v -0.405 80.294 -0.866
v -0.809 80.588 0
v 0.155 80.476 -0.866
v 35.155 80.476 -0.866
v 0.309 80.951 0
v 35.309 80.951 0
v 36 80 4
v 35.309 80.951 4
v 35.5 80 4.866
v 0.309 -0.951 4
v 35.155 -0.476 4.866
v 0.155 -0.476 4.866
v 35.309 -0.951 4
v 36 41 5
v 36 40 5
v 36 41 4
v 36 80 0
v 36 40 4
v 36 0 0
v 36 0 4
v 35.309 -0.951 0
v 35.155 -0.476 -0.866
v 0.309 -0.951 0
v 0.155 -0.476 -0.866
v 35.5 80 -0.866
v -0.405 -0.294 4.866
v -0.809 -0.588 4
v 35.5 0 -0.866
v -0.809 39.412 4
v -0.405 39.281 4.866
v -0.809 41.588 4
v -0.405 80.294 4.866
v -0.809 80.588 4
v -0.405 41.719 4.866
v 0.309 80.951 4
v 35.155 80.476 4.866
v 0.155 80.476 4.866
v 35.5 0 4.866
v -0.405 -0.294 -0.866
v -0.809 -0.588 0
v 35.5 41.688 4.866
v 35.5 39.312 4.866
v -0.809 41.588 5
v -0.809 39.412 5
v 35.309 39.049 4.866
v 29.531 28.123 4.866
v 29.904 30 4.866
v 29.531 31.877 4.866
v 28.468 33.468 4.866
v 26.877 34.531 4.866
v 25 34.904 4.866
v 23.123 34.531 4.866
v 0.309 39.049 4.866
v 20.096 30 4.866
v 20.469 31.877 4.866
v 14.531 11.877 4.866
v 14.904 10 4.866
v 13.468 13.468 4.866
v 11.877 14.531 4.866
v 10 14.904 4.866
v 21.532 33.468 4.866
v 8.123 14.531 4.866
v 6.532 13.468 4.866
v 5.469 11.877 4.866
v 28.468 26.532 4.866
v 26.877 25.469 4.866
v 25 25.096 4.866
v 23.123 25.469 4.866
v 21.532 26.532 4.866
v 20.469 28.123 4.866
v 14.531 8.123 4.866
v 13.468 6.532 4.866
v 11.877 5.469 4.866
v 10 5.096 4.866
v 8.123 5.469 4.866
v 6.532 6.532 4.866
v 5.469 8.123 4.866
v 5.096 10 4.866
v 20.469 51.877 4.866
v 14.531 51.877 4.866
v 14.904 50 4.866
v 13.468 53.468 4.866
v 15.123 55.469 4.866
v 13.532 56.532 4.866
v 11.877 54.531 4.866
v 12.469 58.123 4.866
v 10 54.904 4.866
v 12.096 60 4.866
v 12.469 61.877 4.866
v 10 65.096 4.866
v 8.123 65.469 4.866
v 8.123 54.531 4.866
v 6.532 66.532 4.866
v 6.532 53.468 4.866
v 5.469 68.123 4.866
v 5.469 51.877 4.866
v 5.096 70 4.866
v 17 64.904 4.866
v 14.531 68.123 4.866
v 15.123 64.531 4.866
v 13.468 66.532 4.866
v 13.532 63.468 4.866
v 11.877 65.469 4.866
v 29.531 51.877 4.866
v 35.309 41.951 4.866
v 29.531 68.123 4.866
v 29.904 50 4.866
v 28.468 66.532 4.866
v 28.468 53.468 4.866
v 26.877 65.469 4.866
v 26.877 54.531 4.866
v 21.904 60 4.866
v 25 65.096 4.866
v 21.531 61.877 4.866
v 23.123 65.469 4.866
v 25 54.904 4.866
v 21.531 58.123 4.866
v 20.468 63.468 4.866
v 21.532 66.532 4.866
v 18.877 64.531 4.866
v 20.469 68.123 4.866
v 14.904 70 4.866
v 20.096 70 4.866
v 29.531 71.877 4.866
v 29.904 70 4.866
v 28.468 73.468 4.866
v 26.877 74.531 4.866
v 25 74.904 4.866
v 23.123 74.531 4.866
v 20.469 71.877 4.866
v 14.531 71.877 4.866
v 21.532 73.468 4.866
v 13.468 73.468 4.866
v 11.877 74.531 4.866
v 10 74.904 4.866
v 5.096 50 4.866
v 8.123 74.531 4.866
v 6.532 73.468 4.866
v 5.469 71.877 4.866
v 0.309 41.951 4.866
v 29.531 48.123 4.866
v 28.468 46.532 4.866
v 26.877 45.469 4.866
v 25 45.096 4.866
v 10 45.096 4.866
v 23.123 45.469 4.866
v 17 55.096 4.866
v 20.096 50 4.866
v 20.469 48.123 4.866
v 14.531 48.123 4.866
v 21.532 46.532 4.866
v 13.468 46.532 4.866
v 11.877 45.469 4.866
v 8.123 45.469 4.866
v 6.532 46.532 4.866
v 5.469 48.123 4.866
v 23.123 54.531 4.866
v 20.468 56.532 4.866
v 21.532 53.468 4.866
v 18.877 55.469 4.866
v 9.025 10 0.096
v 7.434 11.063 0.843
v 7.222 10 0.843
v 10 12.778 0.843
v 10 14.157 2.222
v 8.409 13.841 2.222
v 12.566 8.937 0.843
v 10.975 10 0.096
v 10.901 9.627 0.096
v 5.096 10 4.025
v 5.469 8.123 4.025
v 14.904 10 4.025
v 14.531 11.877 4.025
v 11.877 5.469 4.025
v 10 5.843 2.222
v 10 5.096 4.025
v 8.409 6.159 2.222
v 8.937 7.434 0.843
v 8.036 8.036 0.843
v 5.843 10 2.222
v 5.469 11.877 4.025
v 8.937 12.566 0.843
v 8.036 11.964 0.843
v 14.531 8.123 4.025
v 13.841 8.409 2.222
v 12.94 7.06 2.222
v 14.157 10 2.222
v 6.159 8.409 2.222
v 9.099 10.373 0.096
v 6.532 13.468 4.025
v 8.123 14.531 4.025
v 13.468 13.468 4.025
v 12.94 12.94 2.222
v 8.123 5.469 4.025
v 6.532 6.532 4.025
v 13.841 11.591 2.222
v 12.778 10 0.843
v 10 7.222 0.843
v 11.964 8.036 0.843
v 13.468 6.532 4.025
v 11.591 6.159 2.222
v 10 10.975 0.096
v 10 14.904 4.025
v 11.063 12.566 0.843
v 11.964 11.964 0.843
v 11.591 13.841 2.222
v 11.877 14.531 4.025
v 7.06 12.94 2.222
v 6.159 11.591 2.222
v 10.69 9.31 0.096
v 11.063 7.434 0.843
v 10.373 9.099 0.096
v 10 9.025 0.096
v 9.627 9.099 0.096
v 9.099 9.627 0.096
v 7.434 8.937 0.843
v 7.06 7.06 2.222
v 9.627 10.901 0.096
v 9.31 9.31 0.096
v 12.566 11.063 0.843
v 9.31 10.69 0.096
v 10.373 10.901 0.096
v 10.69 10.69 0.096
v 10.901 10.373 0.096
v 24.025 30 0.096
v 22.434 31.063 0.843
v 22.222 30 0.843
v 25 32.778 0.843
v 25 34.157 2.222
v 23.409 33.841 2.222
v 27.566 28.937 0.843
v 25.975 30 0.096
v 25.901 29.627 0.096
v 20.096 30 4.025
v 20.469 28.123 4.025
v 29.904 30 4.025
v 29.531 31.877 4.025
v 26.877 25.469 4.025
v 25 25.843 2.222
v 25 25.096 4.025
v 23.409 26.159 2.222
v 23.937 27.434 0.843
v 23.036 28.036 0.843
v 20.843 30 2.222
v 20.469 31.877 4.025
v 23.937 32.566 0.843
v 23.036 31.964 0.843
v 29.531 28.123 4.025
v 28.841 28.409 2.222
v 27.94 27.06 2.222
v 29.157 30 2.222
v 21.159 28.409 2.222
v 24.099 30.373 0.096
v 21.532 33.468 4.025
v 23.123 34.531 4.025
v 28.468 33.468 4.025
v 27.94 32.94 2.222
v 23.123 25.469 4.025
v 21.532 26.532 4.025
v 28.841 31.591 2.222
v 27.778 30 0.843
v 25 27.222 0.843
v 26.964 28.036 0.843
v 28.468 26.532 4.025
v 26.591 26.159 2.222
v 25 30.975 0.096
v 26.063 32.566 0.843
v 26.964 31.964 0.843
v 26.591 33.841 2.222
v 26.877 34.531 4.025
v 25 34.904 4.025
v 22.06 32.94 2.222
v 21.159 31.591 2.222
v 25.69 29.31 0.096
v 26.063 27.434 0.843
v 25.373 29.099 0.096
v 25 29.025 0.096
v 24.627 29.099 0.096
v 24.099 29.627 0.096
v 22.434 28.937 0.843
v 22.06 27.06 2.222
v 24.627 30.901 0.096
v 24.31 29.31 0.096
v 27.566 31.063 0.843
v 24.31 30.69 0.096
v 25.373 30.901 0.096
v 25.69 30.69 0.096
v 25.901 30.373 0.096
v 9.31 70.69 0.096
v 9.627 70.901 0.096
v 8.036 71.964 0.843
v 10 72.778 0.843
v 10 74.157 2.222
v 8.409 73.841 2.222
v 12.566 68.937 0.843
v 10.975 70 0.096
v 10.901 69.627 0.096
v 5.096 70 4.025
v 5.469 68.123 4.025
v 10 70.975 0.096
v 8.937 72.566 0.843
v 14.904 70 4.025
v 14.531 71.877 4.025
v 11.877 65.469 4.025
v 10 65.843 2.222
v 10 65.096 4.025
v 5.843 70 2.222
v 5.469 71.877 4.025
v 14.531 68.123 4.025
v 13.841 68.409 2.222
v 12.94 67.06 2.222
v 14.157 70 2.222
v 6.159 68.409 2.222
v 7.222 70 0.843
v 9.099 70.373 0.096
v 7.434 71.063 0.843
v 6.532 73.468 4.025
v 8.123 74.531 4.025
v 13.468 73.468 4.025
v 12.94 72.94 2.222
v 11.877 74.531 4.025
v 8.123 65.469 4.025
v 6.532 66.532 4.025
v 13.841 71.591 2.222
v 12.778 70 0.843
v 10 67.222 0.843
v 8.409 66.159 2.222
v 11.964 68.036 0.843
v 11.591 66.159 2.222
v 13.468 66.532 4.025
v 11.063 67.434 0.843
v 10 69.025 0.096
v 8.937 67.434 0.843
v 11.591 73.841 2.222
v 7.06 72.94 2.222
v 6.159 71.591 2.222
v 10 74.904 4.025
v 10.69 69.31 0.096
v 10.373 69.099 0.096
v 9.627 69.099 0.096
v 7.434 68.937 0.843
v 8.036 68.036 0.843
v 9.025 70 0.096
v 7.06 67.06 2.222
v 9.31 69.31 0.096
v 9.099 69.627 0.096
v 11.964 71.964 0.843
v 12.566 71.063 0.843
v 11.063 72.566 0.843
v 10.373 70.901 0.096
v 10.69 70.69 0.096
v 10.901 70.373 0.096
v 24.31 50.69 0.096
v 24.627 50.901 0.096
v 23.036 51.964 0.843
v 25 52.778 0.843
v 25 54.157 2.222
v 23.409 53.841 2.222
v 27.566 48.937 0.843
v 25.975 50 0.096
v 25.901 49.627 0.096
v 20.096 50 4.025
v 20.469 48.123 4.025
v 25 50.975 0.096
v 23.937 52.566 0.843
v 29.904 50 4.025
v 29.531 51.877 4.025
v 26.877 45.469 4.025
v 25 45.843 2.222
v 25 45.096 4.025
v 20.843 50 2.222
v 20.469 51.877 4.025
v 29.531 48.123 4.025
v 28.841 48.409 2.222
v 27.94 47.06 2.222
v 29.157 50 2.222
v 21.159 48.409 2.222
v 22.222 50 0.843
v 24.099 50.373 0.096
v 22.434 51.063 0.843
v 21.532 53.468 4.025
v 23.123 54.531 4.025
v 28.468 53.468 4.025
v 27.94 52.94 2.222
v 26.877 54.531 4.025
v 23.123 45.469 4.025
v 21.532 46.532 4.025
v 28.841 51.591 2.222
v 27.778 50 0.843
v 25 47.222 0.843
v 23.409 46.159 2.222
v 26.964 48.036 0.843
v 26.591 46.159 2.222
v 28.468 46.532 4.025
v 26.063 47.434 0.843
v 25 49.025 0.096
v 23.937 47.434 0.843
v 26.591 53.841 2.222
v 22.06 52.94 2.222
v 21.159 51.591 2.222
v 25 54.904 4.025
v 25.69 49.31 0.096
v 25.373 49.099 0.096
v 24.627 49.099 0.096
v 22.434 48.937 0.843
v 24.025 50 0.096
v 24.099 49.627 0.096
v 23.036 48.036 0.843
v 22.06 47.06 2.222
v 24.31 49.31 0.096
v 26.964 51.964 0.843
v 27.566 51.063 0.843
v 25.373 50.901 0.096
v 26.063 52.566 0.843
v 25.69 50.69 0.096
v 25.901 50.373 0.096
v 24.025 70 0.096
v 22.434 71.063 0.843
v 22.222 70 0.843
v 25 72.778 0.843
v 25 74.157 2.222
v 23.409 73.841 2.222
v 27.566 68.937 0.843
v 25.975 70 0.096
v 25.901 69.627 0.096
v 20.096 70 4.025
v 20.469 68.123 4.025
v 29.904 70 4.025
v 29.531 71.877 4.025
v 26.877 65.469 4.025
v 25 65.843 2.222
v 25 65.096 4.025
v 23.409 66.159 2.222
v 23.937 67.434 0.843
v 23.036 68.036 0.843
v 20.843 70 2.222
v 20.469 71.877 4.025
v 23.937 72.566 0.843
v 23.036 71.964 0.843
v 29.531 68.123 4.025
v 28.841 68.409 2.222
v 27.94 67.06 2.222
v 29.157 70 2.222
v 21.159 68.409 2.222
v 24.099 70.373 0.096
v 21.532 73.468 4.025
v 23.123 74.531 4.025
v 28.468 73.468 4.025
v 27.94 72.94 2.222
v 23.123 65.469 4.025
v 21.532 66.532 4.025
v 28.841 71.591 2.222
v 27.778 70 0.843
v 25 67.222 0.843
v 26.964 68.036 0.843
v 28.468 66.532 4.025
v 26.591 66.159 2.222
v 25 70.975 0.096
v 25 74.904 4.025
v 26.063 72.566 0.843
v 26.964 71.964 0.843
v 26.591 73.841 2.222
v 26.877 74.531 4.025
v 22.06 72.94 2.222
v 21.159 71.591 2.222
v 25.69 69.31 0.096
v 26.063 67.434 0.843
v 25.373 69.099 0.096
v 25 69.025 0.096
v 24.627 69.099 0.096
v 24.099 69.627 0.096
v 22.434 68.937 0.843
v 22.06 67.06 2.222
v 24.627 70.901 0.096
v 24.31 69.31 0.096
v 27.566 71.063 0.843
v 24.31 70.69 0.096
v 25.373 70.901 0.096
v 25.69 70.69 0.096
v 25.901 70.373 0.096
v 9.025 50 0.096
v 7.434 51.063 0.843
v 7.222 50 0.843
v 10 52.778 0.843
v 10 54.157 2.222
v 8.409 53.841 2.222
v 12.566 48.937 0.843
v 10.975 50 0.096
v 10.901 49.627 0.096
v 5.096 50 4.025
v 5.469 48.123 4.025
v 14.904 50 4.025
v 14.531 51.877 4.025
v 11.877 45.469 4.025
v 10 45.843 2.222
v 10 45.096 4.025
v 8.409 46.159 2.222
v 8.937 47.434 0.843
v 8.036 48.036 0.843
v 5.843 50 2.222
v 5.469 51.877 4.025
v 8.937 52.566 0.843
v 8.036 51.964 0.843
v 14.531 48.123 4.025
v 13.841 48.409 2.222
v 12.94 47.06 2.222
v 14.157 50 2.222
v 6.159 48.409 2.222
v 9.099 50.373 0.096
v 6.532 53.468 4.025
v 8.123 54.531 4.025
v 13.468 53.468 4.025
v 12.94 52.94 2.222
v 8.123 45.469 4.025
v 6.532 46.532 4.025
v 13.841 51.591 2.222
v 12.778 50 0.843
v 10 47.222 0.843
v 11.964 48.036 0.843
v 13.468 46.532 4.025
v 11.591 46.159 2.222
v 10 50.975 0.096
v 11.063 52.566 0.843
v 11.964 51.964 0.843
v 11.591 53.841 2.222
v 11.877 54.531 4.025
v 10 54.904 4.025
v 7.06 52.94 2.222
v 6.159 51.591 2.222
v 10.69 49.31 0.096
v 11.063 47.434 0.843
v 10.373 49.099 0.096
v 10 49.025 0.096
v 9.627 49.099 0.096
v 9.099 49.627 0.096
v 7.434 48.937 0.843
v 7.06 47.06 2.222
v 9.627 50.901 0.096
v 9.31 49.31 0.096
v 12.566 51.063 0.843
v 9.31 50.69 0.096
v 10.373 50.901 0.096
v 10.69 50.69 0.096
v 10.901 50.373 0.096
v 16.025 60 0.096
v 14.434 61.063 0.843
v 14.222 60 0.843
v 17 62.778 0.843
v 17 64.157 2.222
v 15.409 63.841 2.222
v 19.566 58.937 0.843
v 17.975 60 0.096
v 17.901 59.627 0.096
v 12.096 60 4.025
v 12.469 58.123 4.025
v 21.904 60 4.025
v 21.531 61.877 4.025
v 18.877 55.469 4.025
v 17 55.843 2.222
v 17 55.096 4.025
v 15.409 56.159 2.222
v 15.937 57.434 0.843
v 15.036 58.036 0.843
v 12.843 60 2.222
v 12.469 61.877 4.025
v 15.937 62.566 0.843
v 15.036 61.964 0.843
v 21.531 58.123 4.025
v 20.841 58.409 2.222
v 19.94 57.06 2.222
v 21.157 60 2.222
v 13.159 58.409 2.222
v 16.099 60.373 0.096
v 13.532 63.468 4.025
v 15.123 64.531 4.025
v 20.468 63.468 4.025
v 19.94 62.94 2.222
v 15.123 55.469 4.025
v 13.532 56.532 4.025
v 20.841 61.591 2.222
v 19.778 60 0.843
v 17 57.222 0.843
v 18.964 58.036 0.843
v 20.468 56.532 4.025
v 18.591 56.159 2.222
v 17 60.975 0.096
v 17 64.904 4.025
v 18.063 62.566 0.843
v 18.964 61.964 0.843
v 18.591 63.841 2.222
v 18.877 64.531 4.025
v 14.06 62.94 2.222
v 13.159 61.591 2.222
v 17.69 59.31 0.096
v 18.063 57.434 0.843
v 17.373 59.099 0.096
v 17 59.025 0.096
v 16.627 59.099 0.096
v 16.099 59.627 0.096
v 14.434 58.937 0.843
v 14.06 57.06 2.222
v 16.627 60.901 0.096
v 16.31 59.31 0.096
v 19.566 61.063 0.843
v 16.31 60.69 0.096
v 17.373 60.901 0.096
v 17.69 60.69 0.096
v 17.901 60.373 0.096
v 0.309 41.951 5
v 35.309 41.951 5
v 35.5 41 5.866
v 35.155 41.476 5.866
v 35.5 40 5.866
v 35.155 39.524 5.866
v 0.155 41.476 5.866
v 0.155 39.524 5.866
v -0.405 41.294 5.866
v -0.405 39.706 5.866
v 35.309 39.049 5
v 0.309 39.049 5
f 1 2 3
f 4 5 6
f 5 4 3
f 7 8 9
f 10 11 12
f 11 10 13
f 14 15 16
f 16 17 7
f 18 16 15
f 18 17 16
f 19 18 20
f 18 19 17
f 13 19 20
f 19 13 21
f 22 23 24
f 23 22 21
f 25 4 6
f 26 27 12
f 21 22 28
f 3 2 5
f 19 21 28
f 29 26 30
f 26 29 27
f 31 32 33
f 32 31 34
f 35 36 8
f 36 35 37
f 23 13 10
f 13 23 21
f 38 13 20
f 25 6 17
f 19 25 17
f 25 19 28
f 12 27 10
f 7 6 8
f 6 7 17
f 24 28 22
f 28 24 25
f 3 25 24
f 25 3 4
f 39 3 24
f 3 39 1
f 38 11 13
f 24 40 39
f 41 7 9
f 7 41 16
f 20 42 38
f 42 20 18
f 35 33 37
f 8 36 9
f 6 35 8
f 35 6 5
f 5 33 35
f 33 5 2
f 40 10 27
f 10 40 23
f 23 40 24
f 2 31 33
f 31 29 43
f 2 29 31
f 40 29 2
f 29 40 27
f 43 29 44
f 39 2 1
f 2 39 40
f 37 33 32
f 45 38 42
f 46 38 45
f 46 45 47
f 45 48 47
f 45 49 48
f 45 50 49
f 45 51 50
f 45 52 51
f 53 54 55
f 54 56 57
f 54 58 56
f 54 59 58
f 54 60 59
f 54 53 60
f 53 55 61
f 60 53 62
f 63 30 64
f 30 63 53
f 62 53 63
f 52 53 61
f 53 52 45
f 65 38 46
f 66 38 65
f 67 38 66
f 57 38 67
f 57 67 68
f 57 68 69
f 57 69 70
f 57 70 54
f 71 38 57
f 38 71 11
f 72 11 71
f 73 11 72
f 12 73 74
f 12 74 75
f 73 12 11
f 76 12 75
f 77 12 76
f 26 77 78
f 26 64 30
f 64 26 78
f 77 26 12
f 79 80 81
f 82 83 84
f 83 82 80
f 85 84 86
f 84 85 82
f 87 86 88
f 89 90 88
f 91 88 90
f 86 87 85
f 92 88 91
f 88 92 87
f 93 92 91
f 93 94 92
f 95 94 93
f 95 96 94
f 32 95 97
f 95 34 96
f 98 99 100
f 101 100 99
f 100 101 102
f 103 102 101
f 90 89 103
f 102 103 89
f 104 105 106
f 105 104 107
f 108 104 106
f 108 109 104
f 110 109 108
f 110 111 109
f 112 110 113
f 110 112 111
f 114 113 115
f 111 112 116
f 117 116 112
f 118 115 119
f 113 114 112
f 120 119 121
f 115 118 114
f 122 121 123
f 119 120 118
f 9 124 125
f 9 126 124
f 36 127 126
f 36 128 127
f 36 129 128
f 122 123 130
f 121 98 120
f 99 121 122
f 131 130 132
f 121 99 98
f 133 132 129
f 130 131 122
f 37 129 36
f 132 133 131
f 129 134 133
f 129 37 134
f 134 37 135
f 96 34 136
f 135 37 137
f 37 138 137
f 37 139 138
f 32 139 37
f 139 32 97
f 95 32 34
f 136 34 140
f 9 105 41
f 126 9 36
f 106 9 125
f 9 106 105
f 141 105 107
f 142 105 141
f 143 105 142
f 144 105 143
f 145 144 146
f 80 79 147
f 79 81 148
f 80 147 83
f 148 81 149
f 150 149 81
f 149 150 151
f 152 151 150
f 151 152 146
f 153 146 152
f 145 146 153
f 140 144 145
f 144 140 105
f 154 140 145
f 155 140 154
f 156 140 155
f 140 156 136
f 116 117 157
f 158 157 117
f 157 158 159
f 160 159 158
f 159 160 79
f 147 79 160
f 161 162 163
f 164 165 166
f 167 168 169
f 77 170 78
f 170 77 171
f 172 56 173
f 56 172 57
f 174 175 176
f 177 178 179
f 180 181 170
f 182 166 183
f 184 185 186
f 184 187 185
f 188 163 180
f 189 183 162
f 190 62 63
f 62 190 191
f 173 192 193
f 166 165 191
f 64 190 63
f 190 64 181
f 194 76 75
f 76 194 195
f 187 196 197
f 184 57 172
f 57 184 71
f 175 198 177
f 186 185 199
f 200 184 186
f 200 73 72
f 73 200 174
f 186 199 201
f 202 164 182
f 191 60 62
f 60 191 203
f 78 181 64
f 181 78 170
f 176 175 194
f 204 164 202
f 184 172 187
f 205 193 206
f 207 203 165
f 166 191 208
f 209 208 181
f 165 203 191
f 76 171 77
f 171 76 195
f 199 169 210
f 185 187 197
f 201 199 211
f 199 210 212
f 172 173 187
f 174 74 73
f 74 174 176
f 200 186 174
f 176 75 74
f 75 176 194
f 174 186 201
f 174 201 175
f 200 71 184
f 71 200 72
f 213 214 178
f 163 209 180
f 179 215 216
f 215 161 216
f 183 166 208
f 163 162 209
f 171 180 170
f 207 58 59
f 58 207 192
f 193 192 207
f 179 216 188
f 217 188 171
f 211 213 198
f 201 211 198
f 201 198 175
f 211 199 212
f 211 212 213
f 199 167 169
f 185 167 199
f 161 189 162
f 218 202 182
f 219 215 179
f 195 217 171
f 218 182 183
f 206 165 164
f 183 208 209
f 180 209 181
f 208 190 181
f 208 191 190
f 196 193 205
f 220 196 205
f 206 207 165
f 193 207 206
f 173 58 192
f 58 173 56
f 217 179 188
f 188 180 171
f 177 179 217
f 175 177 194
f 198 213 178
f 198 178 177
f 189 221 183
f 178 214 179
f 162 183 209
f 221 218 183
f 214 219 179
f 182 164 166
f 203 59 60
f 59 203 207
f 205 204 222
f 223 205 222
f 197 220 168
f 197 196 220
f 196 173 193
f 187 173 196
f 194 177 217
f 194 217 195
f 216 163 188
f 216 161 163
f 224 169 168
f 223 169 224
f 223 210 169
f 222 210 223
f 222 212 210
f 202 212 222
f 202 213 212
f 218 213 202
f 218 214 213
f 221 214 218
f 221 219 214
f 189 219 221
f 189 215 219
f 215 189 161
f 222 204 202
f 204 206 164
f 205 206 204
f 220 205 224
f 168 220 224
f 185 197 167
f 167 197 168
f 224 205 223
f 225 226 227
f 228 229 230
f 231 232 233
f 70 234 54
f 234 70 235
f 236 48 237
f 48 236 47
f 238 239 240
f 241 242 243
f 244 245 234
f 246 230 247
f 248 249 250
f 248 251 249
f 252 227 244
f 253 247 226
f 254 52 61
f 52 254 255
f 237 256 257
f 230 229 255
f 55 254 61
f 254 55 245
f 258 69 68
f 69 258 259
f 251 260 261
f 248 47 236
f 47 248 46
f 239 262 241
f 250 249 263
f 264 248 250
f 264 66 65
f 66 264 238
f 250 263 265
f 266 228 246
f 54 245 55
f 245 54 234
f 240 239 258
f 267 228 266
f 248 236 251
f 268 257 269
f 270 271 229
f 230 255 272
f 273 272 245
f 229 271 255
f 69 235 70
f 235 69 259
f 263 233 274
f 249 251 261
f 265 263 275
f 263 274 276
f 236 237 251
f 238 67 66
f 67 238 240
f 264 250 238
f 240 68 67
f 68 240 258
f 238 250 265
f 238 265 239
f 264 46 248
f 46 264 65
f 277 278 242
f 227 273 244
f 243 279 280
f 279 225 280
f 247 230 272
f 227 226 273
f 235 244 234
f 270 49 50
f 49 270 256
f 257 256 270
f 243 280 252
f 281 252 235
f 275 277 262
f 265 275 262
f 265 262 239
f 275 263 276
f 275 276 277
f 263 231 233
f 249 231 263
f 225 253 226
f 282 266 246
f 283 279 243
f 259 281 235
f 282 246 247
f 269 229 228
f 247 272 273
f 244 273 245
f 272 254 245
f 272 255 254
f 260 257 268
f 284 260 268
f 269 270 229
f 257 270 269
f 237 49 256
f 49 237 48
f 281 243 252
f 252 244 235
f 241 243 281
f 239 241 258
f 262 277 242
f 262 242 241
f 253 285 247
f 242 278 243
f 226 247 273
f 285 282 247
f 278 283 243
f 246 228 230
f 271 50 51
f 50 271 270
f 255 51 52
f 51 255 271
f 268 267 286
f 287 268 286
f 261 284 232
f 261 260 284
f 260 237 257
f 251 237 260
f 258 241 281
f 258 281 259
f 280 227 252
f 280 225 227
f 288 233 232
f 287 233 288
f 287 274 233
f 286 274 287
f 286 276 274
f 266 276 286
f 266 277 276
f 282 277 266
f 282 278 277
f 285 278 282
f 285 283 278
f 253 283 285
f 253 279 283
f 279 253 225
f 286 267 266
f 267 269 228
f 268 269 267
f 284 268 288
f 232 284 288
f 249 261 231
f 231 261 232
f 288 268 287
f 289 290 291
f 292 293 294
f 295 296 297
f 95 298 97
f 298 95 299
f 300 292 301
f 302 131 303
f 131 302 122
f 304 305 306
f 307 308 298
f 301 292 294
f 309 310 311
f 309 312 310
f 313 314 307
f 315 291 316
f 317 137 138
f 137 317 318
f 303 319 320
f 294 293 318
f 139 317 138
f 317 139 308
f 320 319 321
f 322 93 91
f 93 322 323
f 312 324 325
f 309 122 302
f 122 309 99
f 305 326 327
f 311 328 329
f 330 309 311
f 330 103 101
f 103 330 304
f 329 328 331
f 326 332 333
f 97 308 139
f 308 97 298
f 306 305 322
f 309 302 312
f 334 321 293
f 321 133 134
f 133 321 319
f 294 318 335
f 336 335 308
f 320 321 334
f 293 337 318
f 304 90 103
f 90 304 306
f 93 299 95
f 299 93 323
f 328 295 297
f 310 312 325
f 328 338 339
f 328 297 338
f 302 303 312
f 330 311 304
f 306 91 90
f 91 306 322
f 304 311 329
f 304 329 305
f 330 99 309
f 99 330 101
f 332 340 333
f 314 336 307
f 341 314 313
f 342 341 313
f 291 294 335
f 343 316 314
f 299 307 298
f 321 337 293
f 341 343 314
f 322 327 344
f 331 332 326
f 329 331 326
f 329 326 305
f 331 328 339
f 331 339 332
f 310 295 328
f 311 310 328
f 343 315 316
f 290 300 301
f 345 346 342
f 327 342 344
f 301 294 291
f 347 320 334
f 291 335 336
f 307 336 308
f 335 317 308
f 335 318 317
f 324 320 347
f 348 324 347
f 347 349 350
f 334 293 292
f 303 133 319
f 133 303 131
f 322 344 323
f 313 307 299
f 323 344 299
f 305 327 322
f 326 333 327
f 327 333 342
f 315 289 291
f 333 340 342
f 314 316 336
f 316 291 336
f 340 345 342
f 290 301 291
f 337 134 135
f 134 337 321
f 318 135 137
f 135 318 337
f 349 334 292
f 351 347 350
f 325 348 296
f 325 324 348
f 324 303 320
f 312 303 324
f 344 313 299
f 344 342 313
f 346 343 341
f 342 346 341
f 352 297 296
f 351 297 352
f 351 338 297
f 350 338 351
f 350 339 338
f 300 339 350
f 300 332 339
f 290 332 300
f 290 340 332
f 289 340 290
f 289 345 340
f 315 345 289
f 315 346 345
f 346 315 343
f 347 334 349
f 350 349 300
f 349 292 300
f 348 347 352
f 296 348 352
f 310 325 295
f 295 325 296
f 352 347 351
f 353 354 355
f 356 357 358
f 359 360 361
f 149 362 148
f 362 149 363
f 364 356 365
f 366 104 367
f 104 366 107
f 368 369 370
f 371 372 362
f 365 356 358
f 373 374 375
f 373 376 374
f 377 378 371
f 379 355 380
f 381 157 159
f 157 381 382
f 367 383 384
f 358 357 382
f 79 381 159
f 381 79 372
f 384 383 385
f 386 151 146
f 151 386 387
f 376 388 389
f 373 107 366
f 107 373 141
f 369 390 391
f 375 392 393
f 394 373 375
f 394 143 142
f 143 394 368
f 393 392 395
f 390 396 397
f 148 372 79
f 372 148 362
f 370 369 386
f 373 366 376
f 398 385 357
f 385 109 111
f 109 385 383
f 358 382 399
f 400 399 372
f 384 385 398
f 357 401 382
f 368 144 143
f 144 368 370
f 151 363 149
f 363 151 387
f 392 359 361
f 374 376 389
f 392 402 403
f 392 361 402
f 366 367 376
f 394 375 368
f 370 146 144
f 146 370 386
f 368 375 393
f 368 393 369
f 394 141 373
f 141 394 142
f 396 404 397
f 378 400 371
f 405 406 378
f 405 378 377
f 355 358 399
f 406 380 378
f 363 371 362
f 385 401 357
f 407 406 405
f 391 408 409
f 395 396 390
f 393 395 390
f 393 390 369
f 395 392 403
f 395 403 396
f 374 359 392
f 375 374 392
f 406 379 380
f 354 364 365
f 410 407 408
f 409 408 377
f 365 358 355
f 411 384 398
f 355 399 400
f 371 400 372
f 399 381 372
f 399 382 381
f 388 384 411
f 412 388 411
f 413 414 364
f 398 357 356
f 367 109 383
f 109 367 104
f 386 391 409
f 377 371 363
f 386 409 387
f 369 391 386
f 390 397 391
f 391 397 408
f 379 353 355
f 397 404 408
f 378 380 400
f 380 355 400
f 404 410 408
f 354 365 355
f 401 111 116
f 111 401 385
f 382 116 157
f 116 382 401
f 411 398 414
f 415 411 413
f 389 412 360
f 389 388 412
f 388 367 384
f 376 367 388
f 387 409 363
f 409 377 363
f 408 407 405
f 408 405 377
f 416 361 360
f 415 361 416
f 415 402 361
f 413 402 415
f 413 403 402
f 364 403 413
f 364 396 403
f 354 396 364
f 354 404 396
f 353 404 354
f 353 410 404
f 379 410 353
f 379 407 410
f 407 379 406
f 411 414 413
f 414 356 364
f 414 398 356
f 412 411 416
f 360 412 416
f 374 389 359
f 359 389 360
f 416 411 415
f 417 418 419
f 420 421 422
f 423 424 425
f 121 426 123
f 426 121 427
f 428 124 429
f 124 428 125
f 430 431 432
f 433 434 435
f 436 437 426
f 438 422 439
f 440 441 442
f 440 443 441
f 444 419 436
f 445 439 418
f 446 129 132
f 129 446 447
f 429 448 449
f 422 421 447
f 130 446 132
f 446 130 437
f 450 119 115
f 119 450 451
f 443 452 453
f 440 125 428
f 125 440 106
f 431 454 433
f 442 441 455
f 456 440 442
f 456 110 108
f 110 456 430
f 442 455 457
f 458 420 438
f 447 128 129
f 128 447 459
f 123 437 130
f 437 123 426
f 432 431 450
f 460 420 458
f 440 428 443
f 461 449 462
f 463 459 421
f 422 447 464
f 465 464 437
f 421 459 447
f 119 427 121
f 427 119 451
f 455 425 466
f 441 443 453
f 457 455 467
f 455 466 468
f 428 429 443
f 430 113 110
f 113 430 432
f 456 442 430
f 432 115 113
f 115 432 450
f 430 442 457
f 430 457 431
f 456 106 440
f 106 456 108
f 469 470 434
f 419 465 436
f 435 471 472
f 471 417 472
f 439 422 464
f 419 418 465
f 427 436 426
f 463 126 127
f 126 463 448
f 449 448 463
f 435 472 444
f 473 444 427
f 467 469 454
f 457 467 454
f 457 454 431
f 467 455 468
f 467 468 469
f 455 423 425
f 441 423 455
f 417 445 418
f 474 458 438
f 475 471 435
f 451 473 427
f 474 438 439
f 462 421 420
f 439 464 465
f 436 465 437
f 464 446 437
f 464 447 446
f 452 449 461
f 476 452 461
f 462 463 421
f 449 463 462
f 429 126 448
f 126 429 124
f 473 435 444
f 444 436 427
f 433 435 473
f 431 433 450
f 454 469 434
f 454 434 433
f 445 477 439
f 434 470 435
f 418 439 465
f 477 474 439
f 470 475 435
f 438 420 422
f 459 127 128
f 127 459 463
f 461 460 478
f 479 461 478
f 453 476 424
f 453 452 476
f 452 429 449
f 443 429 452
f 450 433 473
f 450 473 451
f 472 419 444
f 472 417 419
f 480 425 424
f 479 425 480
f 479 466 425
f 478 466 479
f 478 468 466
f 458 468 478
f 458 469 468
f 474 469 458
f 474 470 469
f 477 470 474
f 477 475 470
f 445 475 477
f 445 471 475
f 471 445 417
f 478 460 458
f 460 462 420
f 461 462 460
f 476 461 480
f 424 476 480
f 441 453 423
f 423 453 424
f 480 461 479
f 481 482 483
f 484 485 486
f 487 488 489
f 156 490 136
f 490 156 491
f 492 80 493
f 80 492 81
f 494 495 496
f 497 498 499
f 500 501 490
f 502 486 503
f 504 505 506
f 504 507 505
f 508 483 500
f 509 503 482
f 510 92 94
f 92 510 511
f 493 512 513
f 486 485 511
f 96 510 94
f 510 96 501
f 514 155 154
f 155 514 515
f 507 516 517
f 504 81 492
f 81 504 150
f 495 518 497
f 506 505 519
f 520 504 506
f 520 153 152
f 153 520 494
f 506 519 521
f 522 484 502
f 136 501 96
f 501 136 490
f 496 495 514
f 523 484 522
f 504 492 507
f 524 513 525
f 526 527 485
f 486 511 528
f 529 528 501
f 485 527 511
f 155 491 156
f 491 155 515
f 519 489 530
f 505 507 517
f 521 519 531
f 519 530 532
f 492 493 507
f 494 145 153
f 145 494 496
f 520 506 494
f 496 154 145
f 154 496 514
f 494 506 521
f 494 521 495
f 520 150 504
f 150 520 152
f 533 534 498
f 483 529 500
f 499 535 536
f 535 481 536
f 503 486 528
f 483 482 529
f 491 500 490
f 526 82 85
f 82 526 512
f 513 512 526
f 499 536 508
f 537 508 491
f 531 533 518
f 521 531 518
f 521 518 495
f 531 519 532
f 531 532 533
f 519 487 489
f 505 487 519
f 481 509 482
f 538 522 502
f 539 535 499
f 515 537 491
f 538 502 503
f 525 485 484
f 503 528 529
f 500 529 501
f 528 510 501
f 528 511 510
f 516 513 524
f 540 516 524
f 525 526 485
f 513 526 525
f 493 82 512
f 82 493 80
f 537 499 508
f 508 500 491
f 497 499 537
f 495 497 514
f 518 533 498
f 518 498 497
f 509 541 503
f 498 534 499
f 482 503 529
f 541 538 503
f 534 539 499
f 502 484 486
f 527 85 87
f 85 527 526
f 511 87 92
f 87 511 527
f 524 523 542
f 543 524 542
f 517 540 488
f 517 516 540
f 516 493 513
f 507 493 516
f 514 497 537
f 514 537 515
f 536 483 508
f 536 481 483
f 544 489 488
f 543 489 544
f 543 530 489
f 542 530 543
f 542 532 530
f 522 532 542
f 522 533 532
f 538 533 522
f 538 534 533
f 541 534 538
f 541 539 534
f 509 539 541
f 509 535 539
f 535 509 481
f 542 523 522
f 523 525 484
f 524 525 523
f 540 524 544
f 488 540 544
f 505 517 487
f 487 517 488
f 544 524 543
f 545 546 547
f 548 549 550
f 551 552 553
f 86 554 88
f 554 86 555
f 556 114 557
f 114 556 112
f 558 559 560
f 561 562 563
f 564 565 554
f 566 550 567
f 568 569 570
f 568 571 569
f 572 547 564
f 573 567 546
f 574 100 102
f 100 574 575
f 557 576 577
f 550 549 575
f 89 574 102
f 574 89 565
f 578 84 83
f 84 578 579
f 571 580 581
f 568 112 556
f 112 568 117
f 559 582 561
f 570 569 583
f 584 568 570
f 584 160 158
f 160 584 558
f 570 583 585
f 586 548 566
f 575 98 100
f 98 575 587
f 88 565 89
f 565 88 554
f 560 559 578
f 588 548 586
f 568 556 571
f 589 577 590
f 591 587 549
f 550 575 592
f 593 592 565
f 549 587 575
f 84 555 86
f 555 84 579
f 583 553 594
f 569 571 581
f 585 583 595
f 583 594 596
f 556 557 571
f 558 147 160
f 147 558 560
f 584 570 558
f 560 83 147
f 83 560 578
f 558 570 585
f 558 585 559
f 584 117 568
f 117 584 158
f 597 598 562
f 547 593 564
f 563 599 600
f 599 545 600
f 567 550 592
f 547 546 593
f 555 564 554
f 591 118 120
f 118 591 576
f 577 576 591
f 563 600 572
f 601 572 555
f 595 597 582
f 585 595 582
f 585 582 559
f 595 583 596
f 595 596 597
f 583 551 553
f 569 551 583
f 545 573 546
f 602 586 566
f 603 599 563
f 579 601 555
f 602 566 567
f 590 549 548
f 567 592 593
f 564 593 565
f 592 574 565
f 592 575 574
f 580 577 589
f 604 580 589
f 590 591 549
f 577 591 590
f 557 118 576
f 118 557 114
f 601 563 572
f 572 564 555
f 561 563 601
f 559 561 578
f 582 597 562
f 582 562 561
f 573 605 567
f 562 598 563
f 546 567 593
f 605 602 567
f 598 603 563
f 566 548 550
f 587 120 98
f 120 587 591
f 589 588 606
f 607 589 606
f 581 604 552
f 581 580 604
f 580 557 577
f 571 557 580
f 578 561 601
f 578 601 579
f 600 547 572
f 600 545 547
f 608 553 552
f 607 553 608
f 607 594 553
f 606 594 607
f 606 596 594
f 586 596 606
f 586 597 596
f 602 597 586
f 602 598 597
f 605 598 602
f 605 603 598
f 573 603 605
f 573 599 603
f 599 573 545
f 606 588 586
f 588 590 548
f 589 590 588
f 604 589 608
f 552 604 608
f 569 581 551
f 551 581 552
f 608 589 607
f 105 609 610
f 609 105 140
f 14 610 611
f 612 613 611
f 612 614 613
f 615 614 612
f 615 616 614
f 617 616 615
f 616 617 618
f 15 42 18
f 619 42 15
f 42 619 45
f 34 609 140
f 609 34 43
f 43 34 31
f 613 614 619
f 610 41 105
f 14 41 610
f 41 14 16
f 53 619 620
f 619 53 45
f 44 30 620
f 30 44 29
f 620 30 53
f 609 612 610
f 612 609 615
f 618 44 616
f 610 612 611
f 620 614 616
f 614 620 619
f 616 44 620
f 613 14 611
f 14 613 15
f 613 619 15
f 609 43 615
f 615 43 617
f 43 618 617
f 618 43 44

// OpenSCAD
// Loguncov Maxim 13.12.13


//$fn=128;


translate([0,40,0])
minkowski()
{cube([35,1,5]);
sphere(1);
}

difference() {

//основа
minkowski()
{cube([35,80,4]);
sphere(1);
}


//отверстия
translate([10,10,5])sphere(5);
translate([25,30,5])sphere(5);


translate([10,70,5])sphere(5);
translate([25,50,5])sphere(5);
translate([25,70,5])sphere(5);
translate([10,50,5])sphere(5);
translate([17,60,5])sphere(5);

}
